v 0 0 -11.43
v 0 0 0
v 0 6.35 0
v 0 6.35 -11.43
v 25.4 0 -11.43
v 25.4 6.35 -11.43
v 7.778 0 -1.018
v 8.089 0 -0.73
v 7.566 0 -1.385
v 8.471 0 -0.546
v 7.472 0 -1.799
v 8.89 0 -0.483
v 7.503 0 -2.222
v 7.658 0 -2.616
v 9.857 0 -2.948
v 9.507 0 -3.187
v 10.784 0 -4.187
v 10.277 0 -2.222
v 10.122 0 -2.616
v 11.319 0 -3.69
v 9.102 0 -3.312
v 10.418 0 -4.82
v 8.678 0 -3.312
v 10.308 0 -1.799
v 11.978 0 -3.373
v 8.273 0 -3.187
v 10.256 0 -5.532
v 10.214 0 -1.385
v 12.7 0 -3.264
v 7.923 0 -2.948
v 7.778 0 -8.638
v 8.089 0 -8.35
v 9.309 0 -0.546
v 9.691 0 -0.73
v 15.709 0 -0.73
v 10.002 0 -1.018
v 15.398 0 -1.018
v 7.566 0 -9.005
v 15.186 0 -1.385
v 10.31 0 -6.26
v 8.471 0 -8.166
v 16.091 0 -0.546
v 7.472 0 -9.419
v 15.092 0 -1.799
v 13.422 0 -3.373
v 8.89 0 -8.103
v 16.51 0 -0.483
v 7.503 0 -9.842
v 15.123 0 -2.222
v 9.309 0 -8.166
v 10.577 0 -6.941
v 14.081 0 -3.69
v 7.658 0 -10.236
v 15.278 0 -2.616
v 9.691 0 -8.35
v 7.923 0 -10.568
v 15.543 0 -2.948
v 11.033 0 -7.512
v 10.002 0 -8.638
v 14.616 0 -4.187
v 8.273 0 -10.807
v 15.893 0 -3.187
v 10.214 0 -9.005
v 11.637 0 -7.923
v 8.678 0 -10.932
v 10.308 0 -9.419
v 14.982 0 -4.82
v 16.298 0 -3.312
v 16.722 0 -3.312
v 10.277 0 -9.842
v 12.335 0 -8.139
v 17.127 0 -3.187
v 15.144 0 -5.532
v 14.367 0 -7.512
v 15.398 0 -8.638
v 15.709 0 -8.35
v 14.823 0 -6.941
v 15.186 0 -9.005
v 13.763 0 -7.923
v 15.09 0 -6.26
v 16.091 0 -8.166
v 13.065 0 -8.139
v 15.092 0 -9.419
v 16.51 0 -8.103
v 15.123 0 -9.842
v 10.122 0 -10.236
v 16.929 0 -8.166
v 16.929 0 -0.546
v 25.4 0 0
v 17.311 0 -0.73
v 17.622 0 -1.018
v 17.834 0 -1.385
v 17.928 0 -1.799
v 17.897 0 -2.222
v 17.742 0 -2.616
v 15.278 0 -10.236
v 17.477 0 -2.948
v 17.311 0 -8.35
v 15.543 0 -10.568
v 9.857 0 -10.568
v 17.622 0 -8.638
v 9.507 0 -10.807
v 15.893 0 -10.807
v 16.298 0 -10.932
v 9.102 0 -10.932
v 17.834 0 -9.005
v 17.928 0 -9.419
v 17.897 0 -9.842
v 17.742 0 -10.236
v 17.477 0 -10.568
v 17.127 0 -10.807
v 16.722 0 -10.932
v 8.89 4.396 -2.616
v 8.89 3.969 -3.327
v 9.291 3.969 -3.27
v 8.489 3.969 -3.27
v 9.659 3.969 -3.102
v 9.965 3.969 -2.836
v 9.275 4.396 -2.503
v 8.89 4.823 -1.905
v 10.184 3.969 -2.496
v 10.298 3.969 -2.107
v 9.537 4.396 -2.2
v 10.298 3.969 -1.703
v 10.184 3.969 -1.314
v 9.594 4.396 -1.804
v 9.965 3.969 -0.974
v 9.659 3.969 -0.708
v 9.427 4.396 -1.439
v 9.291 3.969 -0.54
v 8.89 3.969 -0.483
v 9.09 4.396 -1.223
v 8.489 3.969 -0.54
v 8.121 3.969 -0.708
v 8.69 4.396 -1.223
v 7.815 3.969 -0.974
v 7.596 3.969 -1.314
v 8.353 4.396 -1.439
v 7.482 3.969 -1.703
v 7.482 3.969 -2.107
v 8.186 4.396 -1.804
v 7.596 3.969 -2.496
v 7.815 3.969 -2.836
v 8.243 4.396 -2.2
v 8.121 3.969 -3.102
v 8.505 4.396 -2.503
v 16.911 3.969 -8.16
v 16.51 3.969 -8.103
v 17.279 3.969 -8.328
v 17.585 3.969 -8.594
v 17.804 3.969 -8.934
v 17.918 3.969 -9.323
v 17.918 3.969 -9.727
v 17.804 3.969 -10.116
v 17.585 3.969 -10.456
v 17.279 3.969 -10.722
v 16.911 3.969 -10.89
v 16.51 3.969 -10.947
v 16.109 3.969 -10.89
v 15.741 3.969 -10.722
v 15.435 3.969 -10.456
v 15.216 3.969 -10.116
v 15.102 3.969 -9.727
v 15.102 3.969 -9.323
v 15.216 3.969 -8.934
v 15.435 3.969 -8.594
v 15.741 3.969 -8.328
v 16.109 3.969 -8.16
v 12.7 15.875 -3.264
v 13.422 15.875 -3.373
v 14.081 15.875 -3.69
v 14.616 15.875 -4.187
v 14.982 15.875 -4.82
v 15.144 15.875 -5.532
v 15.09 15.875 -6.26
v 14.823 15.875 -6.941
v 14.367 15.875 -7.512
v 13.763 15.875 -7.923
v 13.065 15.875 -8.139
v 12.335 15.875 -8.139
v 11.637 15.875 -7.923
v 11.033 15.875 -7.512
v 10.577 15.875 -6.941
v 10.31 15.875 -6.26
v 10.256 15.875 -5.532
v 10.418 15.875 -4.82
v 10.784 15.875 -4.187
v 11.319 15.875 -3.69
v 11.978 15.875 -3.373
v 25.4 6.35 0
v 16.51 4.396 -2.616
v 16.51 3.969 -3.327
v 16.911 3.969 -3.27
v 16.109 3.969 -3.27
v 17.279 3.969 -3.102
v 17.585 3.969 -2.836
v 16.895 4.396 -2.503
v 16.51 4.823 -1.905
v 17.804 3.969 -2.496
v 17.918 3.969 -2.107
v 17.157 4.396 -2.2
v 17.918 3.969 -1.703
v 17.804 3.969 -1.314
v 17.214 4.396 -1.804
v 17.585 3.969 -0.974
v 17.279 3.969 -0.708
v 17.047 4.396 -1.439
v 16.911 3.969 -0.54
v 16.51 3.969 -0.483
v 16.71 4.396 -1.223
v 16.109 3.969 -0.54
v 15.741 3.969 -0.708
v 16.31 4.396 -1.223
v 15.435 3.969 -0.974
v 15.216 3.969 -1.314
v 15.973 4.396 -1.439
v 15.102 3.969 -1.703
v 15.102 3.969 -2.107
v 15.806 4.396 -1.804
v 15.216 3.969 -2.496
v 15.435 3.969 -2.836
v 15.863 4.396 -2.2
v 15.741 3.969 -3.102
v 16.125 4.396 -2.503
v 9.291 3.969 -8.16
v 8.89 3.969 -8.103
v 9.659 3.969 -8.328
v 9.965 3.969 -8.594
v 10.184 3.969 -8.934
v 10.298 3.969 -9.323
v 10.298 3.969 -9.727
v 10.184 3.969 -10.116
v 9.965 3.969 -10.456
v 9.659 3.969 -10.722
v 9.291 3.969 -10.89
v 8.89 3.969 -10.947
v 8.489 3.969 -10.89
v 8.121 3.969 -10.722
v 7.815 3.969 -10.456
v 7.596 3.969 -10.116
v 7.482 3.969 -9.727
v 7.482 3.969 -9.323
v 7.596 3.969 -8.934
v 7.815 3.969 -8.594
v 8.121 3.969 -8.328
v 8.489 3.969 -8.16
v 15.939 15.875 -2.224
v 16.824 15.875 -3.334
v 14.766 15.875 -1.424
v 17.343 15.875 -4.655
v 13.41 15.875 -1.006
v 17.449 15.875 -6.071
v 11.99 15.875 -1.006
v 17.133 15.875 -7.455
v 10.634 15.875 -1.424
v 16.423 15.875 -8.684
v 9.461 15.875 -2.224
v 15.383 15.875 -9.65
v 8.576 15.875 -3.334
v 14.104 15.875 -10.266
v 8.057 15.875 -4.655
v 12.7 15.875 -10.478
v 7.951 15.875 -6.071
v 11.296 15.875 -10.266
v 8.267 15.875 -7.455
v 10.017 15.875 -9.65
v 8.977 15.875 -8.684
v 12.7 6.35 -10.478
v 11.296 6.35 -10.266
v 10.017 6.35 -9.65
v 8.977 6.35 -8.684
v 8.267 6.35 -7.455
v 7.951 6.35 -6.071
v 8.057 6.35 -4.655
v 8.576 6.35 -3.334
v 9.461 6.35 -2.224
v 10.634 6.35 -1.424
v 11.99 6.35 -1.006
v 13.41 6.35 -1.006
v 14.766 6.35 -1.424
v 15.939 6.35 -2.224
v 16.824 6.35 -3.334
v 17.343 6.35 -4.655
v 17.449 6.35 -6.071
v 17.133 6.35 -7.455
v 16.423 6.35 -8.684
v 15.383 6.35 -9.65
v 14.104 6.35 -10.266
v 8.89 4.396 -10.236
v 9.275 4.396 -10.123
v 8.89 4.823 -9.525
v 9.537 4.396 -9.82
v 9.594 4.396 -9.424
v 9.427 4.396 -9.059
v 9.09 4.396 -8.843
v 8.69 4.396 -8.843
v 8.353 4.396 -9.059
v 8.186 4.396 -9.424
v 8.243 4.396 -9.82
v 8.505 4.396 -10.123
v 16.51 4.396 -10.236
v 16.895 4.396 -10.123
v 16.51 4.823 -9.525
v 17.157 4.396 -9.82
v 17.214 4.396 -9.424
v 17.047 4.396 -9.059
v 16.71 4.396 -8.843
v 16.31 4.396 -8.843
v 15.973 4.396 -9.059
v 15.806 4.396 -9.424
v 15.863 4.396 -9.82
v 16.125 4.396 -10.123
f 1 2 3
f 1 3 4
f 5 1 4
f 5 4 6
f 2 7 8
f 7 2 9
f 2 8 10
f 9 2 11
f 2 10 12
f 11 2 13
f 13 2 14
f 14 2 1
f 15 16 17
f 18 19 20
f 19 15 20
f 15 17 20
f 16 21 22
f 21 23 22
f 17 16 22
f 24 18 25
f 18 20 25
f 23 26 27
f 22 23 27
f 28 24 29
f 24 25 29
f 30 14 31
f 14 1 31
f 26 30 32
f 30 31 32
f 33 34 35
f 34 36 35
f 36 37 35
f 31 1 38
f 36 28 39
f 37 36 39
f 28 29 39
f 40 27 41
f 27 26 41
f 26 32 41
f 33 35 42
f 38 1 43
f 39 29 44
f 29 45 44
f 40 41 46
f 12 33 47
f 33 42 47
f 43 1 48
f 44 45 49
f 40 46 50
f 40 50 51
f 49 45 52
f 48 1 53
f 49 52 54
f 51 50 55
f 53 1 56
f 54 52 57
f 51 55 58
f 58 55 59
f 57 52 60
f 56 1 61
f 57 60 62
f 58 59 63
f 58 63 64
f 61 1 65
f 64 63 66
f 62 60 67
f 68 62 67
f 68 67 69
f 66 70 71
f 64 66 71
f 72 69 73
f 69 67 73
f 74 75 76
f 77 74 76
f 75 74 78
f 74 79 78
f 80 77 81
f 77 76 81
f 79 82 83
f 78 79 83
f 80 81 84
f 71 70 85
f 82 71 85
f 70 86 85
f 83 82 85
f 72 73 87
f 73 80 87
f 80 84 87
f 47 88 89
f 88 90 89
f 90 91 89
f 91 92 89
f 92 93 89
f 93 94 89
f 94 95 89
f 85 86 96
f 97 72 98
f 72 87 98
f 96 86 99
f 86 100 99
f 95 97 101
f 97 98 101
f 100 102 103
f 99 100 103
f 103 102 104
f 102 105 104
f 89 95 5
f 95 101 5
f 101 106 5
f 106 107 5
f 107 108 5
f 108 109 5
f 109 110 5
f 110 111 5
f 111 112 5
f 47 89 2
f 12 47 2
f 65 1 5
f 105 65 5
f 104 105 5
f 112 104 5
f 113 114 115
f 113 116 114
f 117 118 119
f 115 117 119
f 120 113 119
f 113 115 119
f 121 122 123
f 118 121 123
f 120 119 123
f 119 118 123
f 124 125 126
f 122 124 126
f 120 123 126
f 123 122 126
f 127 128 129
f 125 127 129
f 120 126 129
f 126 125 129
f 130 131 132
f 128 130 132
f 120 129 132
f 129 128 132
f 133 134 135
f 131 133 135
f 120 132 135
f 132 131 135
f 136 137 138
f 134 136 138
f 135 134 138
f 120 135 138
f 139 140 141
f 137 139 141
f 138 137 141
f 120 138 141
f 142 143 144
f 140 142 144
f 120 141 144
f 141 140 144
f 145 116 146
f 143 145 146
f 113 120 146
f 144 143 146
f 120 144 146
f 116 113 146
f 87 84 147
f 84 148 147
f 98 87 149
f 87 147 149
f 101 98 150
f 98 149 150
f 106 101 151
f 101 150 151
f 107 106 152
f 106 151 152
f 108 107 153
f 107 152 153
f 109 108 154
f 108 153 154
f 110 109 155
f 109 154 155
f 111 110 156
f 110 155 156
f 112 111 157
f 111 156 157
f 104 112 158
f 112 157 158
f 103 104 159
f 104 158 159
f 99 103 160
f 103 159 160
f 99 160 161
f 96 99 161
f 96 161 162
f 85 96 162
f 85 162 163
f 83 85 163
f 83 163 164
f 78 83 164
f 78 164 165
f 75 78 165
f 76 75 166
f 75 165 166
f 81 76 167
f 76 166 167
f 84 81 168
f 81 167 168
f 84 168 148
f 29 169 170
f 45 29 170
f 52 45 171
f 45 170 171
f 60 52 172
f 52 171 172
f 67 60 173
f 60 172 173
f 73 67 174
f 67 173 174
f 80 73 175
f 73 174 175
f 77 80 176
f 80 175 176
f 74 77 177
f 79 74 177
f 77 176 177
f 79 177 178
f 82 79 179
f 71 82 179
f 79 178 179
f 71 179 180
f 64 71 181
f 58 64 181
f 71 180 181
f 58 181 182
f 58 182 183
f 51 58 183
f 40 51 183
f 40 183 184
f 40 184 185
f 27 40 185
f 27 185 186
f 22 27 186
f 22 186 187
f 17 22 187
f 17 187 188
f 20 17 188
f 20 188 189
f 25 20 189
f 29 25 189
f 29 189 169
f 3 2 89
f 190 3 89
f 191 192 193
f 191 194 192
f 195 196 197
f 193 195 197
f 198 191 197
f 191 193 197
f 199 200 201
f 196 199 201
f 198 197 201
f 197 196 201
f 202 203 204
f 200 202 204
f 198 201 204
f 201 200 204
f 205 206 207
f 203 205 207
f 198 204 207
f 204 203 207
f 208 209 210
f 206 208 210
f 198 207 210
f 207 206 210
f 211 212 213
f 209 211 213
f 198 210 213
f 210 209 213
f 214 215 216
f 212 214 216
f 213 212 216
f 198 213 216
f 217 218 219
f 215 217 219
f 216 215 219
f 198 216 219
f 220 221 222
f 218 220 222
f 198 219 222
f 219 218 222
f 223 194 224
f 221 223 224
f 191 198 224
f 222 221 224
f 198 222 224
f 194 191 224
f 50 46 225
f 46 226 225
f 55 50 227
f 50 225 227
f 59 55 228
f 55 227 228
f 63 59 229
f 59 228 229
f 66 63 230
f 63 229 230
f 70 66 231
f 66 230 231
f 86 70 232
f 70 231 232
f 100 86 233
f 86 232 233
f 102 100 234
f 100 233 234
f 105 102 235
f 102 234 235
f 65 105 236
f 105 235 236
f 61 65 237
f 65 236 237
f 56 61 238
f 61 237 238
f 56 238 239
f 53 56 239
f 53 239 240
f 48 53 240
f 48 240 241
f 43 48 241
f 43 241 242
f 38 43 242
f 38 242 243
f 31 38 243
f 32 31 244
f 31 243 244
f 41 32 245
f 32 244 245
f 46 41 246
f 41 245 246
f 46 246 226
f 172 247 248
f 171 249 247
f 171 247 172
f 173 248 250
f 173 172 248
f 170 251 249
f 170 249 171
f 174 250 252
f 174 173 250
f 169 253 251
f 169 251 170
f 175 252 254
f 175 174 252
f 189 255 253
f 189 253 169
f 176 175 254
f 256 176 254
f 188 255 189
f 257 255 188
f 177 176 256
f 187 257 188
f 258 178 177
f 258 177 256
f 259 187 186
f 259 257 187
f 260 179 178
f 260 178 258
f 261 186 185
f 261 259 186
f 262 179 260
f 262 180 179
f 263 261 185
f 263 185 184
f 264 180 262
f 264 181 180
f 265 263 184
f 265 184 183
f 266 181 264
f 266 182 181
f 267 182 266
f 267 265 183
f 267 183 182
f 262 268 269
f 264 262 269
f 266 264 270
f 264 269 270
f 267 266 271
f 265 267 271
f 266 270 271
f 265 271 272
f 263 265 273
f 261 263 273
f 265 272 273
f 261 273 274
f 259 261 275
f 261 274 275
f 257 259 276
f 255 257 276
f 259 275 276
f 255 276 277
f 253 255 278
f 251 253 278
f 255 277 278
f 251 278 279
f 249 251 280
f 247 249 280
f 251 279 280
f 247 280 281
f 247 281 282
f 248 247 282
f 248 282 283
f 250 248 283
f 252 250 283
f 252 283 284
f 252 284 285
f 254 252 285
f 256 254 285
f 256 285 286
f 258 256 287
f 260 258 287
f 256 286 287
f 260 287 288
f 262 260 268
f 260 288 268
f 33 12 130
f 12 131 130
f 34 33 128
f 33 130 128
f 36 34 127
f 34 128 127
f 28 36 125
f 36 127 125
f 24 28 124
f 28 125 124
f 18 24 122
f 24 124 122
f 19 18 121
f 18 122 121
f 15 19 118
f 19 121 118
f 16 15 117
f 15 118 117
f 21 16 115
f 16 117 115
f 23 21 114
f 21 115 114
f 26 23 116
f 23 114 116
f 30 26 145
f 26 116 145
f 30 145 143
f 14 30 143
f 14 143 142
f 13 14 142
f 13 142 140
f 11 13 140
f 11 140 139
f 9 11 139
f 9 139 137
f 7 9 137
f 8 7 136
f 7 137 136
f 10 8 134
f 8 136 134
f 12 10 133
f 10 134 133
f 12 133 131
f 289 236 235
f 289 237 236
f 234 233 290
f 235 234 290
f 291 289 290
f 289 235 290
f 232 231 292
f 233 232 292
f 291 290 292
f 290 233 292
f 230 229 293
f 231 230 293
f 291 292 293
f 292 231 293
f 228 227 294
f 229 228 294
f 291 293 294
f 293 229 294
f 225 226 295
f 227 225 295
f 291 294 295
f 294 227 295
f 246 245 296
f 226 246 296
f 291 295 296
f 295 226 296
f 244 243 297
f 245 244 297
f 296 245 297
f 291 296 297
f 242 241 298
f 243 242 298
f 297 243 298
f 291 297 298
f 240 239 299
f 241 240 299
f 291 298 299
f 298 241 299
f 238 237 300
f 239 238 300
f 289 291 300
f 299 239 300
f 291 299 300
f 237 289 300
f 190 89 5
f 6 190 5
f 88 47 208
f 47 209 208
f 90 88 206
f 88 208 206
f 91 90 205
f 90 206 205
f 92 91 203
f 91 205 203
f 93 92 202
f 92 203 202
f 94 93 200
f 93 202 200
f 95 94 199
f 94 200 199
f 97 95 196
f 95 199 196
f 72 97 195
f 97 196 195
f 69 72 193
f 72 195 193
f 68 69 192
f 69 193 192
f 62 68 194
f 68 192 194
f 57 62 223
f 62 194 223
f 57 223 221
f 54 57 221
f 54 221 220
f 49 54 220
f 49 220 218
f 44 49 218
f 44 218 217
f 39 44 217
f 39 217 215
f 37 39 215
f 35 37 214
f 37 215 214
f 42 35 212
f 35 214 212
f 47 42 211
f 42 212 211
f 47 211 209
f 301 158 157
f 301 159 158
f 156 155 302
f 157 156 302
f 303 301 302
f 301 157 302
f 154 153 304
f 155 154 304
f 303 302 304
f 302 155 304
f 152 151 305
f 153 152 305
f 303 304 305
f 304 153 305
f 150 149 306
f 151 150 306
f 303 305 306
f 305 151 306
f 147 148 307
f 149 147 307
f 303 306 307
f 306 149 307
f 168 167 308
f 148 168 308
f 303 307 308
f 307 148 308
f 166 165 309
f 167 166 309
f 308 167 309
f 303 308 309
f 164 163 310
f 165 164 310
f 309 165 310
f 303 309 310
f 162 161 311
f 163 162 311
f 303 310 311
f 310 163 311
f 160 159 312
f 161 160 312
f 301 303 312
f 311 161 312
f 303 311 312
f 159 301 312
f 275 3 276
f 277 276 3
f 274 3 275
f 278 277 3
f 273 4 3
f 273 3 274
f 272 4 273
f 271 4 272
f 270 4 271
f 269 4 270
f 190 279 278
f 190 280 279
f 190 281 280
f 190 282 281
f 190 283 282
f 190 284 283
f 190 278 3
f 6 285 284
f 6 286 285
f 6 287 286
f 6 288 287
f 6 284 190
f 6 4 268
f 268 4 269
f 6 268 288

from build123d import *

# Parameters (mm, degrees)
SKETCH1_W                      = 25.4
SKETCH1_H                      = 11.43
BOSS_EXTRUDE1_DEPTH            = 6.35
SKETCH2_R                      = 4.7625
BOSS_EXTRUDE2_DEPTH            = 9.525
SKETCH3_R                      = 2.4511
CUT_EXTRUDE1_DEPTH             = 33.059640126
F_60_0_04_DIAMETER_HOLE1_D     = 2.8448
F_60_0_04_DIAMETER_HOLE1_DEPTH = 3.96875
F_60_0_04_DIAMETER_HOLE1_TIP   = 0.854664145


with BuildPart() as part:
    # Sketch1 → Boss-Extrude1 (new body)
    with BuildSketch(Plane(origin=(0, 0, 0), x_dir=(1, 0, 0), z_dir=(0, 1, 0))):
        with Locations((12.7, 5.715)):
            Rectangle(SKETCH1_W, SKETCH1_H)
    extrude(amount=BOSS_EXTRUDE1_DEPTH)

    # Sketch2 → Boss-Extrude2 (add)
    with BuildSketch(Plane(origin=(0, 6.35, 0), x_dir=(1, 0, 0), z_dir=(0, 1, 0))):
        with Locations(Location((12.7, 5.715, 0), (0, 0, 90))):
            Circle(SKETCH2_R)
    extrude(amount=BOSS_EXTRUDE2_DEPTH)

    # Sketch3 → Cut-Extrude1 (cut, through all)
    with BuildSketch(Plane(origin=(0, 15.875, 0), x_dir=(1, 0, 0), z_dir=(0, 1, 0))):
        with Locations(Location((12.7, 5.715, 0), (0, 0, 270))):
            Circle(SKETCH3_R)
    extrude(amount=-CUT_EXTRUDE1_DEPTH, mode=Mode.SUBTRACT)

    # #60 (0.04) Diameter Hole1
    with Locations(Plane(origin=(8.89, 0, -1.905), x_dir=(0, 0, -1), z_dir=(0, -1, 0))):
        with Locations((0, 0), (7.62, 0), (7.62, 7.62), (0, 7.62)):
            Hole(F_60_0_04_DIAMETER_HOLE1_D / 2, depth=F_60_0_04_DIAMETER_HOLE1_DEPTH)
            with Locations((0, 0, -(F_60_0_04_DIAMETER_HOLE1_DEPTH + F_60_0_04_DIAMETER_HOLE1_TIP / 2))):  # 118° drill point
                Cone(0, F_60_0_04_DIAMETER_HOLE1_D / 2, F_60_0_04_DIAMETER_HOLE1_TIP, mode=Mode.SUBTRACT)


solid = part.part
